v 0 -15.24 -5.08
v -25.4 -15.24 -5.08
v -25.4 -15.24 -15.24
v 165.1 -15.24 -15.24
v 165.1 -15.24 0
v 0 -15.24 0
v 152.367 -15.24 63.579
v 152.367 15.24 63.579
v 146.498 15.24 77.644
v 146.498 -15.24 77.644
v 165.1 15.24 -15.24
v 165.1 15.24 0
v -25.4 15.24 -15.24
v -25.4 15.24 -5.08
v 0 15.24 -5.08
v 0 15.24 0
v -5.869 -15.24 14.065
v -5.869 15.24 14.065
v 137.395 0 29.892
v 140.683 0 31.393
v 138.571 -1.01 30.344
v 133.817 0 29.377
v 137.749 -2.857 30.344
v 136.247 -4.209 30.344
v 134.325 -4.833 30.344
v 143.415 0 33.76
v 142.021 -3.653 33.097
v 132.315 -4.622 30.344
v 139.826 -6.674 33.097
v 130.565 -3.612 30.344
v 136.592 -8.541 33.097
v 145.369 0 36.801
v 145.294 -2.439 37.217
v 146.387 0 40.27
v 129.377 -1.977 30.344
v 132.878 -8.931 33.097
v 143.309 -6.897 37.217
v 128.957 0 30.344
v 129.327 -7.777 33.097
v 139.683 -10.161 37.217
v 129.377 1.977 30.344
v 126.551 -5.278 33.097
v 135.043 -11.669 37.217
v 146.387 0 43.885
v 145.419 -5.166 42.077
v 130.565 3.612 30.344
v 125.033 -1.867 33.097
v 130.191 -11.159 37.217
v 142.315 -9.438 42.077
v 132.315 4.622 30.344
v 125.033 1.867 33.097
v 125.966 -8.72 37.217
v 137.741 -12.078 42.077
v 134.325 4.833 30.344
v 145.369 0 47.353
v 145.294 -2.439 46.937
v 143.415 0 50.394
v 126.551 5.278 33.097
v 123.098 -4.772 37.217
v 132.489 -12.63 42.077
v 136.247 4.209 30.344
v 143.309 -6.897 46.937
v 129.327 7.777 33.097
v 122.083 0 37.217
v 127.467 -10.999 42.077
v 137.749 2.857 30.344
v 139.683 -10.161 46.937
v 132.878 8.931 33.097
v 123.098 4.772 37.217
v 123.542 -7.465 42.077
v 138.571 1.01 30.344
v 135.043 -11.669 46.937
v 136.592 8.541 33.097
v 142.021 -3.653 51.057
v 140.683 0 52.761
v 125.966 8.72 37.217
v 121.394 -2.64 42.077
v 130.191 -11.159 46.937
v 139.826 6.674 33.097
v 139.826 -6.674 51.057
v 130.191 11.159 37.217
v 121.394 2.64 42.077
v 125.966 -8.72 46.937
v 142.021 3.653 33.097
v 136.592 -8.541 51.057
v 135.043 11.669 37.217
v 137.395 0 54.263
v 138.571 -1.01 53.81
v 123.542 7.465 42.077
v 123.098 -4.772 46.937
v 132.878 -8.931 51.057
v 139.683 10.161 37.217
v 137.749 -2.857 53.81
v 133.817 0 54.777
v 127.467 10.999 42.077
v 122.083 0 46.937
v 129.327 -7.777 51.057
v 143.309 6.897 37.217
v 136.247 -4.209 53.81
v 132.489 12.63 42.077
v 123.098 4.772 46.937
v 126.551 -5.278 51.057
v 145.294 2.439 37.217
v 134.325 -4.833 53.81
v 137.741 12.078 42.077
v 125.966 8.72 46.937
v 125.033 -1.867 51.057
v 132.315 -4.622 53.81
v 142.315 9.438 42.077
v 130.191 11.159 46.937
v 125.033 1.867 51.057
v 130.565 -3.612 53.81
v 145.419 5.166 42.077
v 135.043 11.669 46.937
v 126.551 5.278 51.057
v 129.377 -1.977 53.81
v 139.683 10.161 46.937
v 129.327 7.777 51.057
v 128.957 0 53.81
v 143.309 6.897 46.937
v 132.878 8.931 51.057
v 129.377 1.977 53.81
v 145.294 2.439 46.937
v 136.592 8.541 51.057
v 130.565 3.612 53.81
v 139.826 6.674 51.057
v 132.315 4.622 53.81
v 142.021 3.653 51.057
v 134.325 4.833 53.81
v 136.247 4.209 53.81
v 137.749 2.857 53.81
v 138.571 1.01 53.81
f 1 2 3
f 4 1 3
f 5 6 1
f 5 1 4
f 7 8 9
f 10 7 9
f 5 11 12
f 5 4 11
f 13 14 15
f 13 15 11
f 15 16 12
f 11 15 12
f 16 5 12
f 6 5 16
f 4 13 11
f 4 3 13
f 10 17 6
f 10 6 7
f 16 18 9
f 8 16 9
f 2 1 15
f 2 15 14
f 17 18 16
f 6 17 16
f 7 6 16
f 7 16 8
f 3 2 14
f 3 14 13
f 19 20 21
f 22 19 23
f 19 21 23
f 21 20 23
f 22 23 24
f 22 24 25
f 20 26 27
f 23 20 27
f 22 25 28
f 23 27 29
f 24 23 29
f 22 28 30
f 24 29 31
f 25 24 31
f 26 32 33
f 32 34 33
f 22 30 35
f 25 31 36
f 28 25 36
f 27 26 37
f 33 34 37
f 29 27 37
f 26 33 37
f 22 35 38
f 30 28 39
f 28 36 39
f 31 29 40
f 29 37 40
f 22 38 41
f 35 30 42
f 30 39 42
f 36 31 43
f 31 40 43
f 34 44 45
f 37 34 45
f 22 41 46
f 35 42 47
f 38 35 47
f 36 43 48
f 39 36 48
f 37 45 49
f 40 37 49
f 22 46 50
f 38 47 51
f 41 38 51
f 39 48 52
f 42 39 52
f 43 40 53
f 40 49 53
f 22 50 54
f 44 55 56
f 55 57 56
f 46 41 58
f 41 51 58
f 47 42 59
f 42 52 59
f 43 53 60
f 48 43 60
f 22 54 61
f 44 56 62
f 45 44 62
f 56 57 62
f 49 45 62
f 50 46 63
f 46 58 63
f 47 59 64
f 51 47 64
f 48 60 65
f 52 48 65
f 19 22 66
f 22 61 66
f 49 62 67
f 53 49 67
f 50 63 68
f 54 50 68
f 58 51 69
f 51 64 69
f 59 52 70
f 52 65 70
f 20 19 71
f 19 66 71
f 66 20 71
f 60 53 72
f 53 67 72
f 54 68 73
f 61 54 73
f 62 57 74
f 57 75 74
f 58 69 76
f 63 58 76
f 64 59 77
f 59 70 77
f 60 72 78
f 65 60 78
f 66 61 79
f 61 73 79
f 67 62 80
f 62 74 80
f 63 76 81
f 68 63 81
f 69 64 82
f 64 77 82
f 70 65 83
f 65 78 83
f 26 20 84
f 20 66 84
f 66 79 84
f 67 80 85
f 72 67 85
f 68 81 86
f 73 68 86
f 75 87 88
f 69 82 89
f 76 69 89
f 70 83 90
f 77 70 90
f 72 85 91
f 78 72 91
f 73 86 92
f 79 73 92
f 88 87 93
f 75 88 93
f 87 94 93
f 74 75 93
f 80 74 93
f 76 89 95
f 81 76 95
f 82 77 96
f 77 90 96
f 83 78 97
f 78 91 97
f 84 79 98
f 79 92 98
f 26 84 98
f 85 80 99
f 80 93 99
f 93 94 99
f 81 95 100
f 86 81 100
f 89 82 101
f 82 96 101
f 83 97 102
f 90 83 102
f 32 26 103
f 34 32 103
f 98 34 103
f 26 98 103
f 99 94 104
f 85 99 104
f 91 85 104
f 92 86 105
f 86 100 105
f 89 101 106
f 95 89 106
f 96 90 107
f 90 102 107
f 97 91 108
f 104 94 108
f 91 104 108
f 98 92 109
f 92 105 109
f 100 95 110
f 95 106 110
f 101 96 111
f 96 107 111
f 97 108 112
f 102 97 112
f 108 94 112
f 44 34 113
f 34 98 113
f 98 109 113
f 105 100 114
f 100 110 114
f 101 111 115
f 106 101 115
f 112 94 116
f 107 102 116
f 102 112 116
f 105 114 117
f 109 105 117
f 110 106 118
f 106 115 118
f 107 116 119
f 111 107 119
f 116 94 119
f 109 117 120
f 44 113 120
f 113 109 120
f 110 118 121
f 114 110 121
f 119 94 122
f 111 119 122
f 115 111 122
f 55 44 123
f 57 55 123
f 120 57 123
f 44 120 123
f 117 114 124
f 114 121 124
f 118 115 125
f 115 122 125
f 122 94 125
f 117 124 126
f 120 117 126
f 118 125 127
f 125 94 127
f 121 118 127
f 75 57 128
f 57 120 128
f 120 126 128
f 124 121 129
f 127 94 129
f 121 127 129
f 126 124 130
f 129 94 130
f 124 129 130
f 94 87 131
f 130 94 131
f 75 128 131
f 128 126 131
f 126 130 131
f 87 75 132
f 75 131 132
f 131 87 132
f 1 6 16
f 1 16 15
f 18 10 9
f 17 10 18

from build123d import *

# Parameters (mm, degrees)
F1_DEPTH = 15.24
F2_DEPTH = 15.24


with BuildPart() as f1:
    # F0 (on Front) → F1 (new body, symmetric)
    with BuildSketch(Plane.XZ):
        Polygon((165.1, 0), (0, 0), (0, -5.08), (-25.4, -5.08), (-25.4, -15.24), (165.1, -15.24), align=None)
    extrude(amount=F1_DEPTH, both=True)


with BuildPart() as f2:
    # F0 (on Front) → F2 (new body, symmetric)
    with BuildSketch(Plane.XZ):
        Polygon((-5.8688389302, 14.0646482221), (0, 0), (152.3670224062, 63.5790884102), (146.498183476, 77.6437366323), align=None)
    extrude(amount=F2_DEPTH, both=True)

    # F0 (on Front) → F3 (revolve)
    with BuildSketch(Plane.XZ):
        with BuildLine():
            Line((133.8166411445, 54.7771500081), (133.8166411445, 29.3771500081))
            ThreePointArc((133.8166411445, 29.3771500081), (146.5166411445, 42.0771500081), (133.8166411445, 54.7771500081))
        make_face()
    revolve(axis=Axis((133.8166411445, 0, 42.0771500081), (0, 0, -1)))


solid = Compound([f1.part, f2.part])
